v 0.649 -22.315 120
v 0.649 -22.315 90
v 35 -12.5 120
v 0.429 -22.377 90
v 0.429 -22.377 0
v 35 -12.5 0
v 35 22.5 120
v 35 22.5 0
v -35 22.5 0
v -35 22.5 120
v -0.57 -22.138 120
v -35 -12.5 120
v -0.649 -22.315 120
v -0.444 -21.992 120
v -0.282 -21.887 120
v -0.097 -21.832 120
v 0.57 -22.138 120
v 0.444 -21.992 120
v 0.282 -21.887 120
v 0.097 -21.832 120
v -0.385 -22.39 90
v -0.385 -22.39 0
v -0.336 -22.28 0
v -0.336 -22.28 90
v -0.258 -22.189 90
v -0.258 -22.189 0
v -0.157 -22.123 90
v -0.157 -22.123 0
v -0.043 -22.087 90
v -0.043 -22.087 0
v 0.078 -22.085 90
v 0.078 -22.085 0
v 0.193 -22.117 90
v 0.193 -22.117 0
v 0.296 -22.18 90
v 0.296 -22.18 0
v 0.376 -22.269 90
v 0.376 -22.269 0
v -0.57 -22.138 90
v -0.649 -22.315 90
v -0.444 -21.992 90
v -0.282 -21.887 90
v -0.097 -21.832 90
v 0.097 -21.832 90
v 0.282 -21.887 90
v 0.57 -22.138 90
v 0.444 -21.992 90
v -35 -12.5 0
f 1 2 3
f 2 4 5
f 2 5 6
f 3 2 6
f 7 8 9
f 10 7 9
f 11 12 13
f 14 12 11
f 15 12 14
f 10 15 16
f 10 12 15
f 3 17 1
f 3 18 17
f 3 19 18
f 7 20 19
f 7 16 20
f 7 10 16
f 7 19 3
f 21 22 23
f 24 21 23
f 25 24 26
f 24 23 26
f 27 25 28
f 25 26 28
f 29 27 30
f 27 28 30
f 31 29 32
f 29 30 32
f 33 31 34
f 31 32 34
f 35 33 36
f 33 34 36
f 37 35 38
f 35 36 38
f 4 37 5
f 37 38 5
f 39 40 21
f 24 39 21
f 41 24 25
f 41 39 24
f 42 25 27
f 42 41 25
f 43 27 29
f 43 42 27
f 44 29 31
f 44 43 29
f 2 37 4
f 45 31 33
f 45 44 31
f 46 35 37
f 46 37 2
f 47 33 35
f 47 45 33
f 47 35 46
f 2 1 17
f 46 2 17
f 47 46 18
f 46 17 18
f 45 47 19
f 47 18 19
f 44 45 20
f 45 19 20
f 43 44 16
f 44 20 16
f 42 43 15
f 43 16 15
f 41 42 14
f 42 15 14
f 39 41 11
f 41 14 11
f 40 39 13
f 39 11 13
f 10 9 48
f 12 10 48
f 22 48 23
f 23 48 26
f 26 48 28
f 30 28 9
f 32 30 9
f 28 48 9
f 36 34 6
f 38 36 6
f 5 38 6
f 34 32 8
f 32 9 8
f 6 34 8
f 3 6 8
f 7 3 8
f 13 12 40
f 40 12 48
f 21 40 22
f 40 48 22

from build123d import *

# Parameters (mm, degrees)
RESSALTO_EXTRUS_O1_DEPTH = 120
ESBO_O3_R                = 0.675
CORTE_EXTRUS_O1_DEPTH    = 30


with BuildPart() as part:
    # Esboço1 → Ressalto-extrusão1 (new body)
    with BuildSketch(Plane.XY):
        with BuildLine():
            Line((35, -12.5), (35, 22.5))
            Line((35, 22.5), (-35, 22.5))
            Line((-35, 22.5), (-35, -12.5))
            Line((-35, -12.5), (-0.384609579, -22.390111549))
            ThreePointArc((-0.384609579, -22.390111549), (0.017433528, -22.081919349), (0.42886001, -22.377468569))
            Line((0.42886001, -22.377468569), (35, -12.5))
        make_face()
    extrude(amount=RESSALTO_EXTRUS_O1_DEPTH)

    # Esboço3 → Corte-extrusão1 (cut)
    with BuildSketch(Plane.XY.offset(120)):
        with Locations((0, -22.5)):
            Circle(ESBO_O3_R)
    extrude(amount=-CORTE_EXTRUS_O1_DEPTH, mode=Mode.SUBTRACT)


solid = part.part
